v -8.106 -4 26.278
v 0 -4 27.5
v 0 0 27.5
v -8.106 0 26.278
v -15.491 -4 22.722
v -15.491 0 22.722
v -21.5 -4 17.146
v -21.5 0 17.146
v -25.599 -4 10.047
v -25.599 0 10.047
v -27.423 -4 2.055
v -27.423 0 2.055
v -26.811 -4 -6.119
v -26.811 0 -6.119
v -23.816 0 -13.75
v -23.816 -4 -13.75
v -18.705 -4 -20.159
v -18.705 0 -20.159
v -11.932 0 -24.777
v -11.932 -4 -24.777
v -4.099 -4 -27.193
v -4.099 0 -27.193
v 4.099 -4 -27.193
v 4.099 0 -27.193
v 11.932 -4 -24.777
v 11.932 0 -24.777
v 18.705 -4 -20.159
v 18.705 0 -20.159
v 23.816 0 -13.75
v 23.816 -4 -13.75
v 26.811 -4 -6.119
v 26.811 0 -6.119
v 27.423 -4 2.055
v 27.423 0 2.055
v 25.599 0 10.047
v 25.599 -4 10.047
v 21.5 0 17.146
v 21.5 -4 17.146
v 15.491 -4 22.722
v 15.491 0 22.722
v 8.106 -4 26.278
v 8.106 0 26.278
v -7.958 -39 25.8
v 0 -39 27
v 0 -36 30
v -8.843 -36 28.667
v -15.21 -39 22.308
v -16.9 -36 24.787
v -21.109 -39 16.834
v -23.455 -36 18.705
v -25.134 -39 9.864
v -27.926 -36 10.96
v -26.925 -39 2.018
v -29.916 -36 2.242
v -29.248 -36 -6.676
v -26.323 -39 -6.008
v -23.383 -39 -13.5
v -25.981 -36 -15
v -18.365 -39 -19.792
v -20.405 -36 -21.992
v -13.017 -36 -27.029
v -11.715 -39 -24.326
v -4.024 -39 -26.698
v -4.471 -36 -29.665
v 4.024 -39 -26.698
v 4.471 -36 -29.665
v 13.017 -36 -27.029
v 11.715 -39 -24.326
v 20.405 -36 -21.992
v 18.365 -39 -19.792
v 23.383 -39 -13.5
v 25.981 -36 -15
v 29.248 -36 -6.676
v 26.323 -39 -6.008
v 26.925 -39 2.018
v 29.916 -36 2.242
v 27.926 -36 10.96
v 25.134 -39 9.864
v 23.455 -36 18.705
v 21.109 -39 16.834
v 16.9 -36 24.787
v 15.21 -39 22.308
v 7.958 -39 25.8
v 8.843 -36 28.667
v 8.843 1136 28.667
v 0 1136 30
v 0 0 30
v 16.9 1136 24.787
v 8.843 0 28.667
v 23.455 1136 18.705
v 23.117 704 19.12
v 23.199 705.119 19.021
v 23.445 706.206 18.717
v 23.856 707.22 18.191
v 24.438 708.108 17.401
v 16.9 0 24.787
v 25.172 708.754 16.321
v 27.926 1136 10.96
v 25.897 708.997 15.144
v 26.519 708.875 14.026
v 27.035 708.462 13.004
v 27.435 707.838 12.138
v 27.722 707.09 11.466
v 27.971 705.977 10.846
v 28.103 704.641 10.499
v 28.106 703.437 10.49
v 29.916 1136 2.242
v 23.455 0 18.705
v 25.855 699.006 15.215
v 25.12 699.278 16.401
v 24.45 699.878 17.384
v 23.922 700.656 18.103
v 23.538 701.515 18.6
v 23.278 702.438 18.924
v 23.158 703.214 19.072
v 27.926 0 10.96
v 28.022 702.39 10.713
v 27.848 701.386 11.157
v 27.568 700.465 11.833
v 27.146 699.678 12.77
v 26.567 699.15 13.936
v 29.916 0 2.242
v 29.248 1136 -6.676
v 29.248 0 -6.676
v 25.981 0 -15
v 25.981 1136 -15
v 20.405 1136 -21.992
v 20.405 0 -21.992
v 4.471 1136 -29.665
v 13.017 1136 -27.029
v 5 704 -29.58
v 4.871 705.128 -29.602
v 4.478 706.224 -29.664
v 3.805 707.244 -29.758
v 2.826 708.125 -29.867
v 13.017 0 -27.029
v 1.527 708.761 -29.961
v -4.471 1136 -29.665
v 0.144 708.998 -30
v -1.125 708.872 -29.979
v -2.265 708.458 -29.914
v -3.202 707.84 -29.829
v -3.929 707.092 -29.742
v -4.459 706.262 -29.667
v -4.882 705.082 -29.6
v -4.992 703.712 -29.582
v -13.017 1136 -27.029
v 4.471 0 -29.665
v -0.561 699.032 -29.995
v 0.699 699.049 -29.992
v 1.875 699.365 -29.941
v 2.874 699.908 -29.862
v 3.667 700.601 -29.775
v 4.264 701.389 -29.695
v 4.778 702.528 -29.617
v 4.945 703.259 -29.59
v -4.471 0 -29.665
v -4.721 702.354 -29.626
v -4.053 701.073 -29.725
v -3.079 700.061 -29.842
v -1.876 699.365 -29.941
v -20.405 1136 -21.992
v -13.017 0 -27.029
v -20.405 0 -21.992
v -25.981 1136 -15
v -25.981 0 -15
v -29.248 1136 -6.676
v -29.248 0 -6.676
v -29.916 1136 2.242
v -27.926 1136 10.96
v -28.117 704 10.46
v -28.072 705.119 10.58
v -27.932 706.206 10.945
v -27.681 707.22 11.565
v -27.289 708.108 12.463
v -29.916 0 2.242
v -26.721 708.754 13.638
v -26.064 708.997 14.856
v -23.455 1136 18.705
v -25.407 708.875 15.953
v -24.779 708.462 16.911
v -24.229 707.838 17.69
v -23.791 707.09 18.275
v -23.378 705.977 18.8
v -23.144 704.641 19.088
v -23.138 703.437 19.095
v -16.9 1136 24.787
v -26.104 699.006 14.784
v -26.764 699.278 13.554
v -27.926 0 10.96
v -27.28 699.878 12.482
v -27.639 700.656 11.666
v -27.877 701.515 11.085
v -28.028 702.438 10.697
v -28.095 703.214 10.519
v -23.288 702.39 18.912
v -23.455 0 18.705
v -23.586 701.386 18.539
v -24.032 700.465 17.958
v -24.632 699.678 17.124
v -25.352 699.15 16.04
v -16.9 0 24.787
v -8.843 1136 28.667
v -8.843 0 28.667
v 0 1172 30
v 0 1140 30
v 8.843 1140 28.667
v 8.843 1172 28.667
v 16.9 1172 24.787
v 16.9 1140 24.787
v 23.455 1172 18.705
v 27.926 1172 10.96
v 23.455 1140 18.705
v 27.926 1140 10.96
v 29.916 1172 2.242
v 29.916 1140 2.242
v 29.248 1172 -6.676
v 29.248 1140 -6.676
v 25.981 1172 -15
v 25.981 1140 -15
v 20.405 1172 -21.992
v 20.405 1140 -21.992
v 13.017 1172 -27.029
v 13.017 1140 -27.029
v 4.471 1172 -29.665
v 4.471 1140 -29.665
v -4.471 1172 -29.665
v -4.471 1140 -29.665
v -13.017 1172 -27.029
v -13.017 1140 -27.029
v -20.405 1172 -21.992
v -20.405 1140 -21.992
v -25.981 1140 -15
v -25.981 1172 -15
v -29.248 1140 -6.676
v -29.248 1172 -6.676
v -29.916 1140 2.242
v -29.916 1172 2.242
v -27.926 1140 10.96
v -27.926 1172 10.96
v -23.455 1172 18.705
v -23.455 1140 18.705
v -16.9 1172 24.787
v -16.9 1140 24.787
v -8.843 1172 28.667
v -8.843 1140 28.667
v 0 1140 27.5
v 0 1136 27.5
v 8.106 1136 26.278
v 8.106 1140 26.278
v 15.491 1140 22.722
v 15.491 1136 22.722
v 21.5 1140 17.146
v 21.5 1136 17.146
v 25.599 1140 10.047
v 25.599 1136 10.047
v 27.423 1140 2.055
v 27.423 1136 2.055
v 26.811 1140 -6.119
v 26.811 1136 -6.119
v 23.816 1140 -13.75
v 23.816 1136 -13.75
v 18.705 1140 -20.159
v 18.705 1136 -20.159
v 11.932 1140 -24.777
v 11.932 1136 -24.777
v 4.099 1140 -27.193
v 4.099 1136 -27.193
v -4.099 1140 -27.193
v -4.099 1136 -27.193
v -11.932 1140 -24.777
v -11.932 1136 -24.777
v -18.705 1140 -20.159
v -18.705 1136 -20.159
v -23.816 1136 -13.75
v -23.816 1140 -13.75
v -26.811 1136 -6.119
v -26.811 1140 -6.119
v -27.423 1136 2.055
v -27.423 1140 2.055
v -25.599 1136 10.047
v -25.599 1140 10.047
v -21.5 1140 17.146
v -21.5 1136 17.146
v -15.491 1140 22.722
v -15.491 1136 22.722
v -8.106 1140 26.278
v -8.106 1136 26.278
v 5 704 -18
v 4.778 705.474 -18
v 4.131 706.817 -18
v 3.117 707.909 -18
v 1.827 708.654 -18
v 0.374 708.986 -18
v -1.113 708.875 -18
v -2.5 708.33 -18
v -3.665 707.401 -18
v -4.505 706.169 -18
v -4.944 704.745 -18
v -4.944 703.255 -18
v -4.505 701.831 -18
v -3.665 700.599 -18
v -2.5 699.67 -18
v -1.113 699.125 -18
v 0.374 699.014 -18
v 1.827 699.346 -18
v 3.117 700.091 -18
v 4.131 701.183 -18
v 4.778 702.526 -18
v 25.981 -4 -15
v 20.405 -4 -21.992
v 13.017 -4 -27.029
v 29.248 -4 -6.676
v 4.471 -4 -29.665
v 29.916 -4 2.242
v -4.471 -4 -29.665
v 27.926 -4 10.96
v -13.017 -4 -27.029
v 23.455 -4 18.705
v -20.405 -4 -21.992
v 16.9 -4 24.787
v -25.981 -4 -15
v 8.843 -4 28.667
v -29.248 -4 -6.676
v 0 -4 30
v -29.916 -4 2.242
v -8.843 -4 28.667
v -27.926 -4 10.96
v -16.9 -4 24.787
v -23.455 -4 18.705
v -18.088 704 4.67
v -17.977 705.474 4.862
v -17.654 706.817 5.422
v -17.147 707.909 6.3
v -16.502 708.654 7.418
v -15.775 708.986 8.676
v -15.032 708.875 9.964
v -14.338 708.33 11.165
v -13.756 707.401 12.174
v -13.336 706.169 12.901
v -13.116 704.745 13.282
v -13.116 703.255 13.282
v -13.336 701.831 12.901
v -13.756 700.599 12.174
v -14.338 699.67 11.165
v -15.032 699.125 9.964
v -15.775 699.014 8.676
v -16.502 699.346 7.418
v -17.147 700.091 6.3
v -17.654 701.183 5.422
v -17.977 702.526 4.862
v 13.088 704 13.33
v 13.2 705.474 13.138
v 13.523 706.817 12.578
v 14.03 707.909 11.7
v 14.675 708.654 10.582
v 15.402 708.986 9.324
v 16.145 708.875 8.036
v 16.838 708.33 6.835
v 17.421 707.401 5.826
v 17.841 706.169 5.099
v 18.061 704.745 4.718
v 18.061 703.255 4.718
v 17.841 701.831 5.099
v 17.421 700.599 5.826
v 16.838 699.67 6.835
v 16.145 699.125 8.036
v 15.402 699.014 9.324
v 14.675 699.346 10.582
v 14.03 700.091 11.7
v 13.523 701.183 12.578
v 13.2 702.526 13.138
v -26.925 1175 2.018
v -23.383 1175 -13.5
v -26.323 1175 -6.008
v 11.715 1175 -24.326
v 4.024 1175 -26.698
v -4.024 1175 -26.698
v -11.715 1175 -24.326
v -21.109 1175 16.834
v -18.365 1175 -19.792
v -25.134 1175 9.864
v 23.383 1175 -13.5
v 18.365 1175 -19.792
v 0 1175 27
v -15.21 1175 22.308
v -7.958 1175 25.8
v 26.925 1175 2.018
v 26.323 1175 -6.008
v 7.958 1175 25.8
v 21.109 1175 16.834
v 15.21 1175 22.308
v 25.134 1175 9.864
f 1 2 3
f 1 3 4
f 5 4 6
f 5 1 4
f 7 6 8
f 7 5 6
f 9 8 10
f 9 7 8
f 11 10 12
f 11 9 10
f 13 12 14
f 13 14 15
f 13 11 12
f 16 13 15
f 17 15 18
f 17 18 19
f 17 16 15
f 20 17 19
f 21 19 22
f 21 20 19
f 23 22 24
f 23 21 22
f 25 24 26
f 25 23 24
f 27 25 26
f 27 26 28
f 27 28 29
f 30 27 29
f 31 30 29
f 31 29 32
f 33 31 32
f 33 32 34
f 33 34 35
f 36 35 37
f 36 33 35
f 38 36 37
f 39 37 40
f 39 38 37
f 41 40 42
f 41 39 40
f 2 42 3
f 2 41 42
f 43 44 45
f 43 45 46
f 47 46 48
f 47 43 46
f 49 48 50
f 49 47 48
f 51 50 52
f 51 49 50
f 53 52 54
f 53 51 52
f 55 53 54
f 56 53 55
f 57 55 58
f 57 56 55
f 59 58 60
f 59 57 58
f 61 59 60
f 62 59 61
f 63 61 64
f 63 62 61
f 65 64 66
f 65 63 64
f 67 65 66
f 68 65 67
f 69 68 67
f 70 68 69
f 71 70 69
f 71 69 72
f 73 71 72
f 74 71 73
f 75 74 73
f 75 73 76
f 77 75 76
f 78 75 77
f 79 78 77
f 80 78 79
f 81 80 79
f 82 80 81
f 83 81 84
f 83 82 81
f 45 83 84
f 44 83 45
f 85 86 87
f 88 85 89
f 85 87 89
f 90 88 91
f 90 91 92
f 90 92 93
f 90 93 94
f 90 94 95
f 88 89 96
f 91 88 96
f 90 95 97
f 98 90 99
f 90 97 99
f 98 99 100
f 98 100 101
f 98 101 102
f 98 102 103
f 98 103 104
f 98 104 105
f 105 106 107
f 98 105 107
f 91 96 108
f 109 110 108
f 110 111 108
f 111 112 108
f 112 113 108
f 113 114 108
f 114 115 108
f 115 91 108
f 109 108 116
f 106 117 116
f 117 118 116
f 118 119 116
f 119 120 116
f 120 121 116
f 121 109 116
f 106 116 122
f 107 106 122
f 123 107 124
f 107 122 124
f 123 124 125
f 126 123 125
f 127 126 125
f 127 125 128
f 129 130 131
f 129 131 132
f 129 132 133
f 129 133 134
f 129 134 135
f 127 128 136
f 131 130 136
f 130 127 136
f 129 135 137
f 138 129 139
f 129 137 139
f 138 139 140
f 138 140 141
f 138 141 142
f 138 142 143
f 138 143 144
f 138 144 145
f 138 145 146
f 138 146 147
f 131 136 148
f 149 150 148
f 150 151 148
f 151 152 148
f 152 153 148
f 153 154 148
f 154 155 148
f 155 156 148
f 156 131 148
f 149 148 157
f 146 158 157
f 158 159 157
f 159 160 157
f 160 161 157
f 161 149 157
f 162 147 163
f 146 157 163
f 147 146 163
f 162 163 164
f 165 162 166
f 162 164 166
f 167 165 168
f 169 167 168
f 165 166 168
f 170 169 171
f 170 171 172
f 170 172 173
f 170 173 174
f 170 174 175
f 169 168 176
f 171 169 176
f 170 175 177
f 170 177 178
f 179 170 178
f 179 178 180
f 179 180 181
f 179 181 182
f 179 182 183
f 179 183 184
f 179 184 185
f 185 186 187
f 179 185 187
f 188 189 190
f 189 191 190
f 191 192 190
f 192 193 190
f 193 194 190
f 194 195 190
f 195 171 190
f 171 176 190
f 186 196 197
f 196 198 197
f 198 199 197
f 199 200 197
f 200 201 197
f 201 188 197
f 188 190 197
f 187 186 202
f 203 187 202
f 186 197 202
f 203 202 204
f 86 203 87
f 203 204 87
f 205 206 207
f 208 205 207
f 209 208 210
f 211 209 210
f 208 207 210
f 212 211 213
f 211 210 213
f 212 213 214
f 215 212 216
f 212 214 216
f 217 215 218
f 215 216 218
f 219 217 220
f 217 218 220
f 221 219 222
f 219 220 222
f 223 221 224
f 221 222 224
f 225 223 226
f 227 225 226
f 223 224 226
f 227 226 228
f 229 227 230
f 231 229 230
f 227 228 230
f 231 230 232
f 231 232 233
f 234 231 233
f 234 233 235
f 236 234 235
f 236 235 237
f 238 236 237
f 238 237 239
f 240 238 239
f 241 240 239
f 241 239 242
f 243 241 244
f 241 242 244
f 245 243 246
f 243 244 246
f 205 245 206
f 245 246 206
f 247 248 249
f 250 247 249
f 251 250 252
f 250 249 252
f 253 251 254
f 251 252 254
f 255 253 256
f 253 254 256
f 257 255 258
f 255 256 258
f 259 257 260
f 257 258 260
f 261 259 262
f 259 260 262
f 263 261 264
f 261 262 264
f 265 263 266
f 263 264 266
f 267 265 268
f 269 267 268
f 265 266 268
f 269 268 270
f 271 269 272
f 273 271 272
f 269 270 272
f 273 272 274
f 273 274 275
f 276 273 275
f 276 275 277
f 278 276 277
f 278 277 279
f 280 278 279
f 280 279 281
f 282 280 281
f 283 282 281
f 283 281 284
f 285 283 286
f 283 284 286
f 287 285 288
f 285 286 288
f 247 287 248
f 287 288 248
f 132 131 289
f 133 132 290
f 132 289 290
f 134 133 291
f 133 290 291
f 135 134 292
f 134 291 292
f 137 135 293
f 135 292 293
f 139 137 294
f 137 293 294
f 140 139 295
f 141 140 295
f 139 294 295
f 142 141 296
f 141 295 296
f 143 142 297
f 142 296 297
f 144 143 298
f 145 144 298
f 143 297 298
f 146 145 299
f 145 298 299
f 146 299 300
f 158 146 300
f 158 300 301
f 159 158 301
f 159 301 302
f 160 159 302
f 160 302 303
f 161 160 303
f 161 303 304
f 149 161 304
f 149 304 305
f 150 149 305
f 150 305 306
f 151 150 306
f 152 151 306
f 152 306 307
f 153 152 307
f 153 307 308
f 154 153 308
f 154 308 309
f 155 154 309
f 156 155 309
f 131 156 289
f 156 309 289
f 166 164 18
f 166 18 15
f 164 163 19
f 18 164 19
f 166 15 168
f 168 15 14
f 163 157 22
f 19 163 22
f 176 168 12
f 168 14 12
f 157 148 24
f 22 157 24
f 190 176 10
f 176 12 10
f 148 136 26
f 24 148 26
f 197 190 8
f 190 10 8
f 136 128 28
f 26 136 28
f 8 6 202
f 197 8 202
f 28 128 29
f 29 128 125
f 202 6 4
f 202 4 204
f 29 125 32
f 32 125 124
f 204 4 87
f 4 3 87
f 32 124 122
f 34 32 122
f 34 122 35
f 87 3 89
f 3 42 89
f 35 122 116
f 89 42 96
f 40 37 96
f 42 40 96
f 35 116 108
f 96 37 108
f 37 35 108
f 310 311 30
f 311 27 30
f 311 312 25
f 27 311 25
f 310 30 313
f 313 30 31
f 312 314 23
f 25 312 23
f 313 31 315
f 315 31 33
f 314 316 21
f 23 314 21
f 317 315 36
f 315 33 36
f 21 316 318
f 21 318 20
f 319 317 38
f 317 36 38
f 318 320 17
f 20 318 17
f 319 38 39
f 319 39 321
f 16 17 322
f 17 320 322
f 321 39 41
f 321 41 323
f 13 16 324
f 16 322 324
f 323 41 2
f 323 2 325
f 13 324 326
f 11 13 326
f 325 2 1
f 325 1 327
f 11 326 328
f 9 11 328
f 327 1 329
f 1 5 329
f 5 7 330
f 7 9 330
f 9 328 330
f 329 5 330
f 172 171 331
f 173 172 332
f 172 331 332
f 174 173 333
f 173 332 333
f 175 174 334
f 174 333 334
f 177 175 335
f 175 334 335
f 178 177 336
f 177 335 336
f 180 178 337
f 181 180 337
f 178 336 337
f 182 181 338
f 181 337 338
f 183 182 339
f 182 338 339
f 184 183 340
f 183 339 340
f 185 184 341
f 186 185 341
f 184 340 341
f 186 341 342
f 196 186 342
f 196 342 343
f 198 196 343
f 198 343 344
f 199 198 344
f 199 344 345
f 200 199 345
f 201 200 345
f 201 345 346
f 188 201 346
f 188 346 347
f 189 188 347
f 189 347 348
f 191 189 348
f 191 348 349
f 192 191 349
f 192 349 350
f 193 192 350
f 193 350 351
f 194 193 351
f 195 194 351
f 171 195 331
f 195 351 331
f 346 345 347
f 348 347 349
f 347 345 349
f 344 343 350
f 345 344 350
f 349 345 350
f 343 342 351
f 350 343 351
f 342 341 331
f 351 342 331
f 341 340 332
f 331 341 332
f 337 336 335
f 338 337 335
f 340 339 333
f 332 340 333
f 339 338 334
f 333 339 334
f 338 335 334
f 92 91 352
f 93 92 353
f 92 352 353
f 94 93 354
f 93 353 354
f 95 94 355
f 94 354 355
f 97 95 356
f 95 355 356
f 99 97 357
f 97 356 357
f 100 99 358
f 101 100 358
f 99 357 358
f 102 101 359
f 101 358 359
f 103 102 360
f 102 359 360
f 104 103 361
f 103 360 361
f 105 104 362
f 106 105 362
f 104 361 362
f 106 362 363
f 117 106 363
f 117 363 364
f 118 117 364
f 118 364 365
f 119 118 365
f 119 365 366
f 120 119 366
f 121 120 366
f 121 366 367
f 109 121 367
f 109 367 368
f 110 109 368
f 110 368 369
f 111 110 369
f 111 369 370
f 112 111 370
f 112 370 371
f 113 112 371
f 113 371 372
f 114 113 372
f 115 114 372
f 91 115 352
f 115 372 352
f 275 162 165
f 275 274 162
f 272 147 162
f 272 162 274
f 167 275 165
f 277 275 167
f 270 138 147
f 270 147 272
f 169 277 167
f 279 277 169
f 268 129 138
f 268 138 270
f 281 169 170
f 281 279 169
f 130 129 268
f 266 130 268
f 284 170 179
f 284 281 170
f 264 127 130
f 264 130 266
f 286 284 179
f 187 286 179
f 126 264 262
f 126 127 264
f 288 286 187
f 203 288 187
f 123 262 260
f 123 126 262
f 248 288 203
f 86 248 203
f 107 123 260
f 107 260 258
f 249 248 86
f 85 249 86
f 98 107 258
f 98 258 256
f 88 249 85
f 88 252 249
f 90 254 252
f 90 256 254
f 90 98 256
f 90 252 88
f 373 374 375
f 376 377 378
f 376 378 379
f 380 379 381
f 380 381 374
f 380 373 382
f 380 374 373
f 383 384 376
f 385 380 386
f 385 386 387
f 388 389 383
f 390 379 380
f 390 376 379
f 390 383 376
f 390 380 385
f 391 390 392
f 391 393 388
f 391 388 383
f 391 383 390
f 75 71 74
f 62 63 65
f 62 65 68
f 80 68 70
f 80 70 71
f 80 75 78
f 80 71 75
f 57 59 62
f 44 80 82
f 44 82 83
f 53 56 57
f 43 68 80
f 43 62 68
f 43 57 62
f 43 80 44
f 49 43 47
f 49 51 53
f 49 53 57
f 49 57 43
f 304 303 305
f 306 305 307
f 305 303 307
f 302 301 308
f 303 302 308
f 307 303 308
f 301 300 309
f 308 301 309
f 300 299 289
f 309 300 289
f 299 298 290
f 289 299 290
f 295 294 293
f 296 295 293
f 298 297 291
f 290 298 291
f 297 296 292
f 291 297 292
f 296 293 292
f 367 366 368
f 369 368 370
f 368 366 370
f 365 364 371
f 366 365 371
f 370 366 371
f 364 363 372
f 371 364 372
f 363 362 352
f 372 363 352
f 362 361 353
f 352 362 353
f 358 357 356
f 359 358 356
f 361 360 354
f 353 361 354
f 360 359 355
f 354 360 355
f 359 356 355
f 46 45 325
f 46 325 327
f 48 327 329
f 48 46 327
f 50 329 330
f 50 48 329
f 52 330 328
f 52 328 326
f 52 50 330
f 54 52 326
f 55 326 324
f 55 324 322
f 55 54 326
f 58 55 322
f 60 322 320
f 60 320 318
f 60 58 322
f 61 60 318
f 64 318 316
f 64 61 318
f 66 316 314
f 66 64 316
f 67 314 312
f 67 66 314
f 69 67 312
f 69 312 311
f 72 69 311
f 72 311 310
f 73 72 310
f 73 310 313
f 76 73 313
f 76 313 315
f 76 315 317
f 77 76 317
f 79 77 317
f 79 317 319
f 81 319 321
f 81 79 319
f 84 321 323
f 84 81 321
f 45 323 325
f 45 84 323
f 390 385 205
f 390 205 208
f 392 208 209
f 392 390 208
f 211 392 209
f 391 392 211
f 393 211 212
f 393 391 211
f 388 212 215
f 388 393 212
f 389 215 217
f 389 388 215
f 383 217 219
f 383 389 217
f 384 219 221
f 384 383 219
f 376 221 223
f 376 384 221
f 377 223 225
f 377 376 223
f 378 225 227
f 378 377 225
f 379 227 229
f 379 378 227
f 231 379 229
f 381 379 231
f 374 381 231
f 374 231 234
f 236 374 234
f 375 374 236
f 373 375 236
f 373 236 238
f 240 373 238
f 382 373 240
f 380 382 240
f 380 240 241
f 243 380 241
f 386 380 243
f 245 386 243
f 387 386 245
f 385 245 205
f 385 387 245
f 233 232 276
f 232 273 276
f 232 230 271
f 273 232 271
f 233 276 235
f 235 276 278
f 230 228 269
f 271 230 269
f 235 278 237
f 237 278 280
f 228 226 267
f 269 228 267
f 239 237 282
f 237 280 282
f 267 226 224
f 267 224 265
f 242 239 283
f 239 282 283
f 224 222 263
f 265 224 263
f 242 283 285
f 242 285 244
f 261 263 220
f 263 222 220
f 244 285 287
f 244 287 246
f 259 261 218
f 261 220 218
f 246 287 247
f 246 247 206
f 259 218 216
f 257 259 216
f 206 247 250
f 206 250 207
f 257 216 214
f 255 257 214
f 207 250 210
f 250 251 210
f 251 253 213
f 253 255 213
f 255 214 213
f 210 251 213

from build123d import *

# Parameters (mm, degrees)
SCHIZZO1_R                  = 30
ESTRUSIONE1_DEPTH           = 1136
SCHIZZO2_R                  = 27.5
ESTRUSIONE2_DEPTH           = 4
SCHIZZO3_R                  = 30
ESTRUSIONE3_DEPTH           = 35
SMUSSO1_SIZE                = 3
ESTRUSIONE4_START           = 4
SCHIZZO4_R                  = 27.5
ESTRUSIONE4_DEPTH           = 4
ESTRUSIONE5_START           = 35
SCHIZZO5_R                  = 30
ESTRUSIONE5_DEPTH           = 35
SMUSSO2_SIZE                = 3
ESTRUSIONE6_START           = -18
SCHIZZO6_R                  = 5
ESTRUSIONE6_DEPTH           = 1158.765707954
RIPETIZIONECIRCOLARE1_COUNT = 3


with BuildPart() as part:
    # Schizzo1 → Estrusione1 (new body)
    with BuildSketch(Plane(origin=(0, 0, 0), x_dir=(1, 0, 0), z_dir=(0, 1, 0))):
        Circle(SCHIZZO1_R)
    extrude(amount=ESTRUSIONE1_DEPTH)

    # Schizzo2 → Estrusione2 (add)
    with BuildSketch(Plane(origin=(0, 1136, 0), x_dir=(1, 0, 0), z_dir=(0, 1, 0))):
        Circle(SCHIZZO2_R)
    extrude(amount=ESTRUSIONE2_DEPTH)

    # Schizzo3 → Estrusione3 (add)
    with BuildSketch(Plane(origin=(0, 1140, 0), x_dir=(1, 0, 0), z_dir=(0, 1, 0))):
        Circle(SCHIZZO3_R)
    extrude(amount=ESTRUSIONE3_DEPTH)

    # Smusso1
    smusso1_edges = [part.edges().sort_by_distance(p)[0] for p in [
        (-30, 1175, 0),
    ]]
    chamfer(smusso1_edges, length=SMUSSO1_SIZE)

    # Schizzo4 → Estrusione4 (add)
    with BuildSketch(Plane.XZ.offset(ESTRUSIONE4_START)):
        Circle(SCHIZZO4_R)
    extrude(amount=-ESTRUSIONE4_DEPTH)

    # Schizzo5 → Estrusione5 (add)
    with BuildSketch(Plane.XZ.offset(4).offset(ESTRUSIONE5_START)):
        Circle(SCHIZZO5_R)
    extrude(amount=-ESTRUSIONE5_DEPTH)

    # Smusso2
    smusso2_edges = [part.edges().sort_by_distance(p)[0] for p in [
        (-30, -39, 0),
    ]]
    chamfer(smusso2_edges, length=SMUSSO2_SIZE)

    # Schizzo6 → Estrusione6 (cut, through all)
    with BuildSketch(Plane.XY.offset(ESTRUSIONE6_START)):
        with Locations((0, 704)):
            Circle(SCHIZZO6_R)
    estrusione6 = extrude(amount=-ESTRUSIONE6_DEPTH, mode=Mode.SUBTRACT)

    # RipetizioneCircolare1: Estrusione6 ×3 about axis
    ripetizionecircolare1_axis = Axis((0, 1136, 0), (0, -1, 0))
    for i in range(1, RIPETIZIONECIRCOLARE1_COUNT):
        add(estrusione6.rotate(ripetizionecircolare1_axis, i * 360 / RIPETIZIONECIRCOLARE1_COUNT), mode=Mode.SUBTRACT)


solid = part.part
